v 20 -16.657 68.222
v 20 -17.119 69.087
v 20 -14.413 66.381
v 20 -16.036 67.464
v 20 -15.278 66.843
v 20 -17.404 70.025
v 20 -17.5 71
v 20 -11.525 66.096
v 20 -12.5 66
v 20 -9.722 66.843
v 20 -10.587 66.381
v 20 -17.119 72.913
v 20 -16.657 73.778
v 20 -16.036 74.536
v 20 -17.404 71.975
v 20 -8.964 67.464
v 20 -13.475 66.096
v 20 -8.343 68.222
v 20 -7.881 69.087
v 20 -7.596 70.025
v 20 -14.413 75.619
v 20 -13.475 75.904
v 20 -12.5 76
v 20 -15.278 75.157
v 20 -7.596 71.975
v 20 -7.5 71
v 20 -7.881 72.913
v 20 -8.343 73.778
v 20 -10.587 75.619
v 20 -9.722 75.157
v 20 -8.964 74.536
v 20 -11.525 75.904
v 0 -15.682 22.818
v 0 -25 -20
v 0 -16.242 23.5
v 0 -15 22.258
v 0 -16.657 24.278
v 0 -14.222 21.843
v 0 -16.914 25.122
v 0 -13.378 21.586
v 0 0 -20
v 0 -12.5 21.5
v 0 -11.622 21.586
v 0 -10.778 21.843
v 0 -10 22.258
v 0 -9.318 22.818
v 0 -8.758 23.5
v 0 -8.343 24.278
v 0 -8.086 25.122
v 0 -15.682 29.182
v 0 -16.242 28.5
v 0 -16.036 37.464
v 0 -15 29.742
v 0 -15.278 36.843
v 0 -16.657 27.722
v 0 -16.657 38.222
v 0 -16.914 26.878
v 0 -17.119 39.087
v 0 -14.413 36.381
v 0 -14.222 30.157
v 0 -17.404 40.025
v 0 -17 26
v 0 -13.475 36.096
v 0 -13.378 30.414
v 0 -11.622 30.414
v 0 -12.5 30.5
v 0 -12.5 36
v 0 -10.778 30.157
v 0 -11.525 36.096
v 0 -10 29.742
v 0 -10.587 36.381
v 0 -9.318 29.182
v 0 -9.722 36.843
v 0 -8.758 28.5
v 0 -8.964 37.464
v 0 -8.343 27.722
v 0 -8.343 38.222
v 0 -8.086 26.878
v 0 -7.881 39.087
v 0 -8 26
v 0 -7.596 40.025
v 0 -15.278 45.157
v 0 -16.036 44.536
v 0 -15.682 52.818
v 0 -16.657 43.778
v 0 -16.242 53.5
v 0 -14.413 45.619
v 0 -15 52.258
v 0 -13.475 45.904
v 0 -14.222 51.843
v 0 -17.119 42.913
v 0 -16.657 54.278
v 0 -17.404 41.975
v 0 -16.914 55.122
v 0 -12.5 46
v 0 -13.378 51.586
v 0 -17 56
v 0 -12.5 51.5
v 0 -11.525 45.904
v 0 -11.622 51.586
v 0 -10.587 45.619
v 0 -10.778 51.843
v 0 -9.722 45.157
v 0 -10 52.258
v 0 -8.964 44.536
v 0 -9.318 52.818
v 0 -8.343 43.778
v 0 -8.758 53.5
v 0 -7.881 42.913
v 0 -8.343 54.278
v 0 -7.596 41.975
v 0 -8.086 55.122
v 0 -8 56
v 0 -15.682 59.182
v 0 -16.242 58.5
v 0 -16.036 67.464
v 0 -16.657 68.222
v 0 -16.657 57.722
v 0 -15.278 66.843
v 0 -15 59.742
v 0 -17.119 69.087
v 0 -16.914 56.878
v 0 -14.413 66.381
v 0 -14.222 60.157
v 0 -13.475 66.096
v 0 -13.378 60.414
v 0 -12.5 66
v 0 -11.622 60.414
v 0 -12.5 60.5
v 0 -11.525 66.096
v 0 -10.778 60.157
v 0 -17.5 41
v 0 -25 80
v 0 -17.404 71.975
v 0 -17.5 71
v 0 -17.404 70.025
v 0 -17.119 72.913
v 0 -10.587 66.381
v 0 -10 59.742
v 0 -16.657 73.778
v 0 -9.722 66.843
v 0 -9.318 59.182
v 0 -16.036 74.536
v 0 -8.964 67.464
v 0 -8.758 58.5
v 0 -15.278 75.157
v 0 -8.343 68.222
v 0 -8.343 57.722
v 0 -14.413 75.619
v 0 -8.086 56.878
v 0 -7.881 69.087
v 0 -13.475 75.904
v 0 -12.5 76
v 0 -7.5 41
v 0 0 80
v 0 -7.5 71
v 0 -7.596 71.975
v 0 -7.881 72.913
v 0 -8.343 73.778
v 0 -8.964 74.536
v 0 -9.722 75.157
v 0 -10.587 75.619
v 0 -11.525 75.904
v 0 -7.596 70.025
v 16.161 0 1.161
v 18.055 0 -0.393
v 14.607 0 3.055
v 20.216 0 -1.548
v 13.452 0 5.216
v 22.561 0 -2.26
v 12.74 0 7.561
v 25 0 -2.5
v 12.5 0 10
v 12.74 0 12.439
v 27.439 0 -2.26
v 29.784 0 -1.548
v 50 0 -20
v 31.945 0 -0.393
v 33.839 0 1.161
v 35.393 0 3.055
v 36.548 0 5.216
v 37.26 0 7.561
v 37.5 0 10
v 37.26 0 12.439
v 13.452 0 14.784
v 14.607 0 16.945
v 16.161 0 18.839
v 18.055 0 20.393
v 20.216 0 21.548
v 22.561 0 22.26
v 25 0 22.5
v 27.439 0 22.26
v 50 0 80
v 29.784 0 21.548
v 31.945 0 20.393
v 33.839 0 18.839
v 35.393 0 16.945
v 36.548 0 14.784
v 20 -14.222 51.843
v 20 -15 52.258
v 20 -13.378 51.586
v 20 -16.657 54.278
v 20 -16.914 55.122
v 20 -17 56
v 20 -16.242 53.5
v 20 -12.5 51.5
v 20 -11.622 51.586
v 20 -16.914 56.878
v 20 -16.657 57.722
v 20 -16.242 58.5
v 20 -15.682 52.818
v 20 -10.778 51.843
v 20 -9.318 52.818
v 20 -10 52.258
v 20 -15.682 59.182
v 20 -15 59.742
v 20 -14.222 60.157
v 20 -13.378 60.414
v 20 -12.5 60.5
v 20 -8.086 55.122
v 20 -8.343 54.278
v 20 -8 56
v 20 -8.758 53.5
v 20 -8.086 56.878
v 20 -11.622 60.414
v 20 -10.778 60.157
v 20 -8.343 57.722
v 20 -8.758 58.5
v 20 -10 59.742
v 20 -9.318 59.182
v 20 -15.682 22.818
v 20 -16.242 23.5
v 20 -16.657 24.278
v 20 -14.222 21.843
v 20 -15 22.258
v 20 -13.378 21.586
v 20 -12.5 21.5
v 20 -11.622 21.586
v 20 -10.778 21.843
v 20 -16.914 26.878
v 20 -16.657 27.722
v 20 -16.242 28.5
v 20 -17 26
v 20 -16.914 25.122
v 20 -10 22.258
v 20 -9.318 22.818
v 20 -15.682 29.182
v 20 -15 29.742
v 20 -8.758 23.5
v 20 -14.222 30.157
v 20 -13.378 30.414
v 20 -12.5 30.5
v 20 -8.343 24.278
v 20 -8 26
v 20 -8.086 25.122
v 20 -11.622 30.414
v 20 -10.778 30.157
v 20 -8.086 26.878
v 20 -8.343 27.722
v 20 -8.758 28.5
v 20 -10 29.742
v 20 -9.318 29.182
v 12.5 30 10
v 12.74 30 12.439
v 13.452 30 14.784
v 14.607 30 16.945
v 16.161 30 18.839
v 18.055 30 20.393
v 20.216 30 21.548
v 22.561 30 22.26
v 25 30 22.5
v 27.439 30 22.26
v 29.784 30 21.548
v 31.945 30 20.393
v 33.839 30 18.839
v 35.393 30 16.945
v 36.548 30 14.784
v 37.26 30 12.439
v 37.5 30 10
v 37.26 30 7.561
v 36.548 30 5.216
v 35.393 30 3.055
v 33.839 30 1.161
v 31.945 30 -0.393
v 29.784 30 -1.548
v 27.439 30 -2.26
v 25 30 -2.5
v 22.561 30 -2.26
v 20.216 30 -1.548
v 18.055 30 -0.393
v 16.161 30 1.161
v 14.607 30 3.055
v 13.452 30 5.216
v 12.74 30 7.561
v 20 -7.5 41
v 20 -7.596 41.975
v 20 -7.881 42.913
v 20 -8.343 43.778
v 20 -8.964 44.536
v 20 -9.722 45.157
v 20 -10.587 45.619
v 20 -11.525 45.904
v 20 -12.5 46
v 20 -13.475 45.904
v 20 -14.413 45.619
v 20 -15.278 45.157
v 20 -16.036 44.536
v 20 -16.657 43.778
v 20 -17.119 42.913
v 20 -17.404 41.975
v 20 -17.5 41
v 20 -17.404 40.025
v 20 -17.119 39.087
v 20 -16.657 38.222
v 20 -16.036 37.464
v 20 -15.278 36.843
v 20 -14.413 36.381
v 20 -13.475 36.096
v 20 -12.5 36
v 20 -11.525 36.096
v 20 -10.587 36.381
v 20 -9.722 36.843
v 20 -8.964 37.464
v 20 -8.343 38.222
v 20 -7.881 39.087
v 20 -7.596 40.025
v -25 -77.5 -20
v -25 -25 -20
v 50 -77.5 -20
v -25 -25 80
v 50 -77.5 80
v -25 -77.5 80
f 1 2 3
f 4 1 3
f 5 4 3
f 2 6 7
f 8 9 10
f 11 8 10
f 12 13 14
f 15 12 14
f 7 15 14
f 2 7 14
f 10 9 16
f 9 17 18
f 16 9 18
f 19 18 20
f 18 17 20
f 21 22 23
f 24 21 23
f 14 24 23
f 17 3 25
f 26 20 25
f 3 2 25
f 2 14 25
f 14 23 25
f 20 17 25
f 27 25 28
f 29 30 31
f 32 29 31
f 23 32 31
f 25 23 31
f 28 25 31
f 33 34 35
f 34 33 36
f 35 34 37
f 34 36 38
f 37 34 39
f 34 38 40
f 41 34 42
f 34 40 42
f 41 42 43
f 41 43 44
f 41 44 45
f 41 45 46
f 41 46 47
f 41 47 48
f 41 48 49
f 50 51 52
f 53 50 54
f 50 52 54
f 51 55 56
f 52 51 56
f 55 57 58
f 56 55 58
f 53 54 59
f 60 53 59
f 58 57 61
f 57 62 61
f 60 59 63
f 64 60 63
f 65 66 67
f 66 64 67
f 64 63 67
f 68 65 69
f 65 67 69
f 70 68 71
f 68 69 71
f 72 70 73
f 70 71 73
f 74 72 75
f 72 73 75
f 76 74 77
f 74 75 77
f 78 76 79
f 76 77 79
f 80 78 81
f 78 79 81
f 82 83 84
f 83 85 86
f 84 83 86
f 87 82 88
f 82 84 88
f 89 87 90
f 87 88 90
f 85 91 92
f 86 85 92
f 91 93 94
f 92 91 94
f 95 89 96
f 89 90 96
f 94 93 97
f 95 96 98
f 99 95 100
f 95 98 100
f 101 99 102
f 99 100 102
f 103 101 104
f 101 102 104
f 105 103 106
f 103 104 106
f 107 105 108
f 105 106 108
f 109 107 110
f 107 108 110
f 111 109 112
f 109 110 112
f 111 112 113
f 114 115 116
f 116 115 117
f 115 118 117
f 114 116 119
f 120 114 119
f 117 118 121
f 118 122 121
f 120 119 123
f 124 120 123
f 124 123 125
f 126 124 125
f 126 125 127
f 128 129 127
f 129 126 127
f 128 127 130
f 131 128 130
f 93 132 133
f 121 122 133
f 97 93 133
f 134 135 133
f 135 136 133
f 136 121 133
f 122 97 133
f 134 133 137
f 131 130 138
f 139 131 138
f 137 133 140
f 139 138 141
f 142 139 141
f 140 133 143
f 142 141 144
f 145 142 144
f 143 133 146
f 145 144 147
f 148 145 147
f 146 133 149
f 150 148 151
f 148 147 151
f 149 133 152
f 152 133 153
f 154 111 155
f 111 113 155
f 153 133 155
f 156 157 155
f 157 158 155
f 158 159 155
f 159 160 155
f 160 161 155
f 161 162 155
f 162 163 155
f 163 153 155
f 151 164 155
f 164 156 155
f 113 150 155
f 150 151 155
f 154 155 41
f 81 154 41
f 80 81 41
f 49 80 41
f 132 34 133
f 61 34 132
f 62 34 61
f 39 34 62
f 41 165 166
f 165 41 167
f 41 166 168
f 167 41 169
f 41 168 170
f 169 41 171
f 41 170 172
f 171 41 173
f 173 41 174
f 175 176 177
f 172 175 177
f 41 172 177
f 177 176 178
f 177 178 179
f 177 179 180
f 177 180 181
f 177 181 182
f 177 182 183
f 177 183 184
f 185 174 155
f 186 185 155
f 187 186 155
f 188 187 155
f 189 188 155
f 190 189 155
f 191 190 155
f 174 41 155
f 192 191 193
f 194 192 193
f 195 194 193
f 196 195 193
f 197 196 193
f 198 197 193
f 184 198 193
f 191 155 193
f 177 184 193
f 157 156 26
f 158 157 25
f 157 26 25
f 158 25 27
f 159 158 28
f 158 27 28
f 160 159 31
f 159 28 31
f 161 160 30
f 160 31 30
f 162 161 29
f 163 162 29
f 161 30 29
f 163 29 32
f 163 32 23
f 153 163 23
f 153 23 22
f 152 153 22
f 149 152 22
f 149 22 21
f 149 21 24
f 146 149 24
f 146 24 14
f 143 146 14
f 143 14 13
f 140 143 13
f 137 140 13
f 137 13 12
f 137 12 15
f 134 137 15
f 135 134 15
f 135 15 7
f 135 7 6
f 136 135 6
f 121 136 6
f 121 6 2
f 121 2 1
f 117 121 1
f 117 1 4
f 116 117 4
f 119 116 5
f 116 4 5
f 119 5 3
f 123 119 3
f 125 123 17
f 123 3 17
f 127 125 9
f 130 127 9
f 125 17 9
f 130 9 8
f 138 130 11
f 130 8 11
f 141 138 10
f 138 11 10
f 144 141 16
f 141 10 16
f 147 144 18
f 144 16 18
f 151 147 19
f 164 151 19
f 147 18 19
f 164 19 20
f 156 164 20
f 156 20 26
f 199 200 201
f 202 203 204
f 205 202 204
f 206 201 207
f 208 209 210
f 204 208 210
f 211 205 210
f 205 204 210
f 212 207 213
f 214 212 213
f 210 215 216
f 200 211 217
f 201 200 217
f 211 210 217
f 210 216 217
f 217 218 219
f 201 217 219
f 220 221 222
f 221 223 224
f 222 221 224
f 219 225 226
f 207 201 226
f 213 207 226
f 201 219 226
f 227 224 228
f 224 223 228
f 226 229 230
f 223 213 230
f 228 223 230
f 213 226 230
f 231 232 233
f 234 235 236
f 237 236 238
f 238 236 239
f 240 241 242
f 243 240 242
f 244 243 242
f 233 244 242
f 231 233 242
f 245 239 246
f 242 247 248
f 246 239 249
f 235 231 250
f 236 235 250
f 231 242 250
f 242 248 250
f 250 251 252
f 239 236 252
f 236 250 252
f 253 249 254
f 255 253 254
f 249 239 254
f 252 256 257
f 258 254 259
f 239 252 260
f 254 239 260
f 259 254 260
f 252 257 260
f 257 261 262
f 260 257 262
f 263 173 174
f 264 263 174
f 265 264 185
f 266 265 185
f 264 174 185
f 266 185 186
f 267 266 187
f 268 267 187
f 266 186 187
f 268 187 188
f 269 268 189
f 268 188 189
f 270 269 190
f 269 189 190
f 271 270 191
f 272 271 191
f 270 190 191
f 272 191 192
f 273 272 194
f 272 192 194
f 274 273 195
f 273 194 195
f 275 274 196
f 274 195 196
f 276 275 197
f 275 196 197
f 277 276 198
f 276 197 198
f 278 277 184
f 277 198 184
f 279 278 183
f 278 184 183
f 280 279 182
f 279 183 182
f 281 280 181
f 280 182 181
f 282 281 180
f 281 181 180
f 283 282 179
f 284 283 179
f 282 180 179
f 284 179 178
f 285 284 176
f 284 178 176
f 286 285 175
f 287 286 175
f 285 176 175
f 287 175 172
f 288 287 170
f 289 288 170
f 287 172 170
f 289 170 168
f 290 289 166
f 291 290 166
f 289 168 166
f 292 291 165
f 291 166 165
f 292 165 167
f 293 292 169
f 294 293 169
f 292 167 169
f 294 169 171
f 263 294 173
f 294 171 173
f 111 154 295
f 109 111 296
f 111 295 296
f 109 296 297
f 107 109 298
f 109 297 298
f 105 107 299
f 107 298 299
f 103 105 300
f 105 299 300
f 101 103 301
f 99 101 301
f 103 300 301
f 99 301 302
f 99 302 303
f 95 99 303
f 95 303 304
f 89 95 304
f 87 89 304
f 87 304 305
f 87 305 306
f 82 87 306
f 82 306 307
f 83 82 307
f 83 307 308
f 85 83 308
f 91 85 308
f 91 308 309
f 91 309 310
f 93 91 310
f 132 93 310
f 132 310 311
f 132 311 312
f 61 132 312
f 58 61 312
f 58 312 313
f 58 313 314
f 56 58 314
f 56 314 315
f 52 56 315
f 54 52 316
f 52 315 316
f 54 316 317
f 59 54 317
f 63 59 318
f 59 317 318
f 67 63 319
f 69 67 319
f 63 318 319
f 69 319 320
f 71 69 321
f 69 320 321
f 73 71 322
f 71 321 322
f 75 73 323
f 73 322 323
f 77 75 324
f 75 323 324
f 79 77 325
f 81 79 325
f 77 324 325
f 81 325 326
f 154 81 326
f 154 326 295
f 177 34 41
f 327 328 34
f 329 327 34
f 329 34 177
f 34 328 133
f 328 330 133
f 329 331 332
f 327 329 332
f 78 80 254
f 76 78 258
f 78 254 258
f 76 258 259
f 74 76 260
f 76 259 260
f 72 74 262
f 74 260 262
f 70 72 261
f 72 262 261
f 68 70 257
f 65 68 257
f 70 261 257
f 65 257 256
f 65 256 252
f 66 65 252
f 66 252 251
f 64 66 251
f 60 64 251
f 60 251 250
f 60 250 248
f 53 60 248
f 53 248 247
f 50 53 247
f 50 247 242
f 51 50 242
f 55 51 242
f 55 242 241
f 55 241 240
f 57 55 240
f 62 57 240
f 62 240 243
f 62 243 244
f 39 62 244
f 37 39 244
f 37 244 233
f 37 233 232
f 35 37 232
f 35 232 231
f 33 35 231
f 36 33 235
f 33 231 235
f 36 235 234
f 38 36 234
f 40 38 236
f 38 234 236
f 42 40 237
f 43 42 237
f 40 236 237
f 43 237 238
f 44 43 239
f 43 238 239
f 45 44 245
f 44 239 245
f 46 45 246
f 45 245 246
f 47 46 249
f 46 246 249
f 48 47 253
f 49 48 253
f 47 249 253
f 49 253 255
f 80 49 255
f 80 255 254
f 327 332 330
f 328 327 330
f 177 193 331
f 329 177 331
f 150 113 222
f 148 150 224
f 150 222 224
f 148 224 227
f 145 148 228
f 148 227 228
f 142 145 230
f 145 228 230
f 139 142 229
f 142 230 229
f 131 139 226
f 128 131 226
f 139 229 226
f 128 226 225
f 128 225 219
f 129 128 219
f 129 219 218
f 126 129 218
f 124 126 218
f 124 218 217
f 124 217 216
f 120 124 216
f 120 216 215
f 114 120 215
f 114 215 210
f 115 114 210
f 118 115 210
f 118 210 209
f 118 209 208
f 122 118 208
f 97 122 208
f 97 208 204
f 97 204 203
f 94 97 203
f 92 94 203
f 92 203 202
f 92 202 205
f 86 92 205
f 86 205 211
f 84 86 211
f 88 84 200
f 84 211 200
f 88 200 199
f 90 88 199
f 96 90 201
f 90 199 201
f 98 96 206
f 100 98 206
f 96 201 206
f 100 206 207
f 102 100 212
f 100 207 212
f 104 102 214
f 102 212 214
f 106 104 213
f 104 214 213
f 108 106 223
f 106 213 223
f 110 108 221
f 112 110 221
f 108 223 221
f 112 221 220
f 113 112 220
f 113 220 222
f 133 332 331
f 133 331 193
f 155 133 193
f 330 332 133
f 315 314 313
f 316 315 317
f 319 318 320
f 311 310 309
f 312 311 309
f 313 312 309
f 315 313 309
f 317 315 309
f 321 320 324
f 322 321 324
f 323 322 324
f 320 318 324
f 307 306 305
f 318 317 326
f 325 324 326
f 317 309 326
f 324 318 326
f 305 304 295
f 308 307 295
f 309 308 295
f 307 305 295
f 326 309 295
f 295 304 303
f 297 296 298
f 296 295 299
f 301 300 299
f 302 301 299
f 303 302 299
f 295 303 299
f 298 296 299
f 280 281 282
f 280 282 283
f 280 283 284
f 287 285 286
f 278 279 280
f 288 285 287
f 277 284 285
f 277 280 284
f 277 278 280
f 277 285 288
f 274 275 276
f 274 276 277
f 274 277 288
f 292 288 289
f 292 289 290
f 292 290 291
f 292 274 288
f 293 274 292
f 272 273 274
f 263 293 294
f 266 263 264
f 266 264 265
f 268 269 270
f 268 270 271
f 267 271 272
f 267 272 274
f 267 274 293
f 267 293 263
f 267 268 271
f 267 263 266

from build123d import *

# Parameters (mm, degrees)
F0_W      = 20
F0_H      = 25
F1_DEPTH  = 80
F2_R      = 5
F2_R_2    = 4.5
F3_DEPTH  = 25
F5_DEPTH  = 52.5
F6_W      = 25
F6_H      = 80
F7_DEPTH  = 30
F9_DEPTH  = 20
F10_R     = 12.5
F11_DEPTH = 30


with BuildPart() as f1:
    # F0 (on Top) → F1 (new body)
    with BuildSketch(Plane.XY):
        with Locations((10, -12.5)):
            Rectangle(F0_W, F0_H)
    extrude(amount=F1_DEPTH)

    # F2 (on face) → F3 (cut)
    with BuildSketch(Plane.YZ.offset(20)):
        with Locations((-12.5, 71)):
            Circle(F2_R)
        with Locations((-12.5, 56)):
            Circle(F2_R_2)
        with Locations((-12.5, 41)):
            Circle(F2_R)
        with Locations((-12.5, 26)):
            Circle(F2_R_2)
    extrude(amount=-F3_DEPTH, mode=Mode.SUBTRACT)

    # F4 (on face) → F5 (join)
    with BuildSketch(Plane.XZ.offset(25)):
        Polygon((-25, 0), (0, 0), (50, 0), (50, 80), (-25, 80), align=None)
    extrude(amount=F5_DEPTH)

    # F6 (on face) → F7 (join)
    with BuildSketch(Plane.YZ.offset(20)):
        with Locations((-12.5, 40)):
            Rectangle(F6_W, F6_H)
    extrude(amount=F7_DEPTH)

    # F8 (on face) → F9 (join)
    with BuildSketch(Plane(origin=(0, 0, 0), x_dir=(1, 0, 0), z_dir=(0, 0, -1))):
        Polygon((-25, 77.5), (-25, 25), (0, 25), (0, 0), (50, 0), (50, 77.5), align=None)
    extrude(amount=F9_DEPTH)

    # F10 (on face) → F11 (join)
    with BuildSketch(Plane(origin=(0, 0, 0), x_dir=(-1, 0, 0), z_dir=(0, 1, 0))):
        with Locations((-25, 10)):
            Circle(F10_R)
    extrude(amount=F11_DEPTH)


solid = f1.part
